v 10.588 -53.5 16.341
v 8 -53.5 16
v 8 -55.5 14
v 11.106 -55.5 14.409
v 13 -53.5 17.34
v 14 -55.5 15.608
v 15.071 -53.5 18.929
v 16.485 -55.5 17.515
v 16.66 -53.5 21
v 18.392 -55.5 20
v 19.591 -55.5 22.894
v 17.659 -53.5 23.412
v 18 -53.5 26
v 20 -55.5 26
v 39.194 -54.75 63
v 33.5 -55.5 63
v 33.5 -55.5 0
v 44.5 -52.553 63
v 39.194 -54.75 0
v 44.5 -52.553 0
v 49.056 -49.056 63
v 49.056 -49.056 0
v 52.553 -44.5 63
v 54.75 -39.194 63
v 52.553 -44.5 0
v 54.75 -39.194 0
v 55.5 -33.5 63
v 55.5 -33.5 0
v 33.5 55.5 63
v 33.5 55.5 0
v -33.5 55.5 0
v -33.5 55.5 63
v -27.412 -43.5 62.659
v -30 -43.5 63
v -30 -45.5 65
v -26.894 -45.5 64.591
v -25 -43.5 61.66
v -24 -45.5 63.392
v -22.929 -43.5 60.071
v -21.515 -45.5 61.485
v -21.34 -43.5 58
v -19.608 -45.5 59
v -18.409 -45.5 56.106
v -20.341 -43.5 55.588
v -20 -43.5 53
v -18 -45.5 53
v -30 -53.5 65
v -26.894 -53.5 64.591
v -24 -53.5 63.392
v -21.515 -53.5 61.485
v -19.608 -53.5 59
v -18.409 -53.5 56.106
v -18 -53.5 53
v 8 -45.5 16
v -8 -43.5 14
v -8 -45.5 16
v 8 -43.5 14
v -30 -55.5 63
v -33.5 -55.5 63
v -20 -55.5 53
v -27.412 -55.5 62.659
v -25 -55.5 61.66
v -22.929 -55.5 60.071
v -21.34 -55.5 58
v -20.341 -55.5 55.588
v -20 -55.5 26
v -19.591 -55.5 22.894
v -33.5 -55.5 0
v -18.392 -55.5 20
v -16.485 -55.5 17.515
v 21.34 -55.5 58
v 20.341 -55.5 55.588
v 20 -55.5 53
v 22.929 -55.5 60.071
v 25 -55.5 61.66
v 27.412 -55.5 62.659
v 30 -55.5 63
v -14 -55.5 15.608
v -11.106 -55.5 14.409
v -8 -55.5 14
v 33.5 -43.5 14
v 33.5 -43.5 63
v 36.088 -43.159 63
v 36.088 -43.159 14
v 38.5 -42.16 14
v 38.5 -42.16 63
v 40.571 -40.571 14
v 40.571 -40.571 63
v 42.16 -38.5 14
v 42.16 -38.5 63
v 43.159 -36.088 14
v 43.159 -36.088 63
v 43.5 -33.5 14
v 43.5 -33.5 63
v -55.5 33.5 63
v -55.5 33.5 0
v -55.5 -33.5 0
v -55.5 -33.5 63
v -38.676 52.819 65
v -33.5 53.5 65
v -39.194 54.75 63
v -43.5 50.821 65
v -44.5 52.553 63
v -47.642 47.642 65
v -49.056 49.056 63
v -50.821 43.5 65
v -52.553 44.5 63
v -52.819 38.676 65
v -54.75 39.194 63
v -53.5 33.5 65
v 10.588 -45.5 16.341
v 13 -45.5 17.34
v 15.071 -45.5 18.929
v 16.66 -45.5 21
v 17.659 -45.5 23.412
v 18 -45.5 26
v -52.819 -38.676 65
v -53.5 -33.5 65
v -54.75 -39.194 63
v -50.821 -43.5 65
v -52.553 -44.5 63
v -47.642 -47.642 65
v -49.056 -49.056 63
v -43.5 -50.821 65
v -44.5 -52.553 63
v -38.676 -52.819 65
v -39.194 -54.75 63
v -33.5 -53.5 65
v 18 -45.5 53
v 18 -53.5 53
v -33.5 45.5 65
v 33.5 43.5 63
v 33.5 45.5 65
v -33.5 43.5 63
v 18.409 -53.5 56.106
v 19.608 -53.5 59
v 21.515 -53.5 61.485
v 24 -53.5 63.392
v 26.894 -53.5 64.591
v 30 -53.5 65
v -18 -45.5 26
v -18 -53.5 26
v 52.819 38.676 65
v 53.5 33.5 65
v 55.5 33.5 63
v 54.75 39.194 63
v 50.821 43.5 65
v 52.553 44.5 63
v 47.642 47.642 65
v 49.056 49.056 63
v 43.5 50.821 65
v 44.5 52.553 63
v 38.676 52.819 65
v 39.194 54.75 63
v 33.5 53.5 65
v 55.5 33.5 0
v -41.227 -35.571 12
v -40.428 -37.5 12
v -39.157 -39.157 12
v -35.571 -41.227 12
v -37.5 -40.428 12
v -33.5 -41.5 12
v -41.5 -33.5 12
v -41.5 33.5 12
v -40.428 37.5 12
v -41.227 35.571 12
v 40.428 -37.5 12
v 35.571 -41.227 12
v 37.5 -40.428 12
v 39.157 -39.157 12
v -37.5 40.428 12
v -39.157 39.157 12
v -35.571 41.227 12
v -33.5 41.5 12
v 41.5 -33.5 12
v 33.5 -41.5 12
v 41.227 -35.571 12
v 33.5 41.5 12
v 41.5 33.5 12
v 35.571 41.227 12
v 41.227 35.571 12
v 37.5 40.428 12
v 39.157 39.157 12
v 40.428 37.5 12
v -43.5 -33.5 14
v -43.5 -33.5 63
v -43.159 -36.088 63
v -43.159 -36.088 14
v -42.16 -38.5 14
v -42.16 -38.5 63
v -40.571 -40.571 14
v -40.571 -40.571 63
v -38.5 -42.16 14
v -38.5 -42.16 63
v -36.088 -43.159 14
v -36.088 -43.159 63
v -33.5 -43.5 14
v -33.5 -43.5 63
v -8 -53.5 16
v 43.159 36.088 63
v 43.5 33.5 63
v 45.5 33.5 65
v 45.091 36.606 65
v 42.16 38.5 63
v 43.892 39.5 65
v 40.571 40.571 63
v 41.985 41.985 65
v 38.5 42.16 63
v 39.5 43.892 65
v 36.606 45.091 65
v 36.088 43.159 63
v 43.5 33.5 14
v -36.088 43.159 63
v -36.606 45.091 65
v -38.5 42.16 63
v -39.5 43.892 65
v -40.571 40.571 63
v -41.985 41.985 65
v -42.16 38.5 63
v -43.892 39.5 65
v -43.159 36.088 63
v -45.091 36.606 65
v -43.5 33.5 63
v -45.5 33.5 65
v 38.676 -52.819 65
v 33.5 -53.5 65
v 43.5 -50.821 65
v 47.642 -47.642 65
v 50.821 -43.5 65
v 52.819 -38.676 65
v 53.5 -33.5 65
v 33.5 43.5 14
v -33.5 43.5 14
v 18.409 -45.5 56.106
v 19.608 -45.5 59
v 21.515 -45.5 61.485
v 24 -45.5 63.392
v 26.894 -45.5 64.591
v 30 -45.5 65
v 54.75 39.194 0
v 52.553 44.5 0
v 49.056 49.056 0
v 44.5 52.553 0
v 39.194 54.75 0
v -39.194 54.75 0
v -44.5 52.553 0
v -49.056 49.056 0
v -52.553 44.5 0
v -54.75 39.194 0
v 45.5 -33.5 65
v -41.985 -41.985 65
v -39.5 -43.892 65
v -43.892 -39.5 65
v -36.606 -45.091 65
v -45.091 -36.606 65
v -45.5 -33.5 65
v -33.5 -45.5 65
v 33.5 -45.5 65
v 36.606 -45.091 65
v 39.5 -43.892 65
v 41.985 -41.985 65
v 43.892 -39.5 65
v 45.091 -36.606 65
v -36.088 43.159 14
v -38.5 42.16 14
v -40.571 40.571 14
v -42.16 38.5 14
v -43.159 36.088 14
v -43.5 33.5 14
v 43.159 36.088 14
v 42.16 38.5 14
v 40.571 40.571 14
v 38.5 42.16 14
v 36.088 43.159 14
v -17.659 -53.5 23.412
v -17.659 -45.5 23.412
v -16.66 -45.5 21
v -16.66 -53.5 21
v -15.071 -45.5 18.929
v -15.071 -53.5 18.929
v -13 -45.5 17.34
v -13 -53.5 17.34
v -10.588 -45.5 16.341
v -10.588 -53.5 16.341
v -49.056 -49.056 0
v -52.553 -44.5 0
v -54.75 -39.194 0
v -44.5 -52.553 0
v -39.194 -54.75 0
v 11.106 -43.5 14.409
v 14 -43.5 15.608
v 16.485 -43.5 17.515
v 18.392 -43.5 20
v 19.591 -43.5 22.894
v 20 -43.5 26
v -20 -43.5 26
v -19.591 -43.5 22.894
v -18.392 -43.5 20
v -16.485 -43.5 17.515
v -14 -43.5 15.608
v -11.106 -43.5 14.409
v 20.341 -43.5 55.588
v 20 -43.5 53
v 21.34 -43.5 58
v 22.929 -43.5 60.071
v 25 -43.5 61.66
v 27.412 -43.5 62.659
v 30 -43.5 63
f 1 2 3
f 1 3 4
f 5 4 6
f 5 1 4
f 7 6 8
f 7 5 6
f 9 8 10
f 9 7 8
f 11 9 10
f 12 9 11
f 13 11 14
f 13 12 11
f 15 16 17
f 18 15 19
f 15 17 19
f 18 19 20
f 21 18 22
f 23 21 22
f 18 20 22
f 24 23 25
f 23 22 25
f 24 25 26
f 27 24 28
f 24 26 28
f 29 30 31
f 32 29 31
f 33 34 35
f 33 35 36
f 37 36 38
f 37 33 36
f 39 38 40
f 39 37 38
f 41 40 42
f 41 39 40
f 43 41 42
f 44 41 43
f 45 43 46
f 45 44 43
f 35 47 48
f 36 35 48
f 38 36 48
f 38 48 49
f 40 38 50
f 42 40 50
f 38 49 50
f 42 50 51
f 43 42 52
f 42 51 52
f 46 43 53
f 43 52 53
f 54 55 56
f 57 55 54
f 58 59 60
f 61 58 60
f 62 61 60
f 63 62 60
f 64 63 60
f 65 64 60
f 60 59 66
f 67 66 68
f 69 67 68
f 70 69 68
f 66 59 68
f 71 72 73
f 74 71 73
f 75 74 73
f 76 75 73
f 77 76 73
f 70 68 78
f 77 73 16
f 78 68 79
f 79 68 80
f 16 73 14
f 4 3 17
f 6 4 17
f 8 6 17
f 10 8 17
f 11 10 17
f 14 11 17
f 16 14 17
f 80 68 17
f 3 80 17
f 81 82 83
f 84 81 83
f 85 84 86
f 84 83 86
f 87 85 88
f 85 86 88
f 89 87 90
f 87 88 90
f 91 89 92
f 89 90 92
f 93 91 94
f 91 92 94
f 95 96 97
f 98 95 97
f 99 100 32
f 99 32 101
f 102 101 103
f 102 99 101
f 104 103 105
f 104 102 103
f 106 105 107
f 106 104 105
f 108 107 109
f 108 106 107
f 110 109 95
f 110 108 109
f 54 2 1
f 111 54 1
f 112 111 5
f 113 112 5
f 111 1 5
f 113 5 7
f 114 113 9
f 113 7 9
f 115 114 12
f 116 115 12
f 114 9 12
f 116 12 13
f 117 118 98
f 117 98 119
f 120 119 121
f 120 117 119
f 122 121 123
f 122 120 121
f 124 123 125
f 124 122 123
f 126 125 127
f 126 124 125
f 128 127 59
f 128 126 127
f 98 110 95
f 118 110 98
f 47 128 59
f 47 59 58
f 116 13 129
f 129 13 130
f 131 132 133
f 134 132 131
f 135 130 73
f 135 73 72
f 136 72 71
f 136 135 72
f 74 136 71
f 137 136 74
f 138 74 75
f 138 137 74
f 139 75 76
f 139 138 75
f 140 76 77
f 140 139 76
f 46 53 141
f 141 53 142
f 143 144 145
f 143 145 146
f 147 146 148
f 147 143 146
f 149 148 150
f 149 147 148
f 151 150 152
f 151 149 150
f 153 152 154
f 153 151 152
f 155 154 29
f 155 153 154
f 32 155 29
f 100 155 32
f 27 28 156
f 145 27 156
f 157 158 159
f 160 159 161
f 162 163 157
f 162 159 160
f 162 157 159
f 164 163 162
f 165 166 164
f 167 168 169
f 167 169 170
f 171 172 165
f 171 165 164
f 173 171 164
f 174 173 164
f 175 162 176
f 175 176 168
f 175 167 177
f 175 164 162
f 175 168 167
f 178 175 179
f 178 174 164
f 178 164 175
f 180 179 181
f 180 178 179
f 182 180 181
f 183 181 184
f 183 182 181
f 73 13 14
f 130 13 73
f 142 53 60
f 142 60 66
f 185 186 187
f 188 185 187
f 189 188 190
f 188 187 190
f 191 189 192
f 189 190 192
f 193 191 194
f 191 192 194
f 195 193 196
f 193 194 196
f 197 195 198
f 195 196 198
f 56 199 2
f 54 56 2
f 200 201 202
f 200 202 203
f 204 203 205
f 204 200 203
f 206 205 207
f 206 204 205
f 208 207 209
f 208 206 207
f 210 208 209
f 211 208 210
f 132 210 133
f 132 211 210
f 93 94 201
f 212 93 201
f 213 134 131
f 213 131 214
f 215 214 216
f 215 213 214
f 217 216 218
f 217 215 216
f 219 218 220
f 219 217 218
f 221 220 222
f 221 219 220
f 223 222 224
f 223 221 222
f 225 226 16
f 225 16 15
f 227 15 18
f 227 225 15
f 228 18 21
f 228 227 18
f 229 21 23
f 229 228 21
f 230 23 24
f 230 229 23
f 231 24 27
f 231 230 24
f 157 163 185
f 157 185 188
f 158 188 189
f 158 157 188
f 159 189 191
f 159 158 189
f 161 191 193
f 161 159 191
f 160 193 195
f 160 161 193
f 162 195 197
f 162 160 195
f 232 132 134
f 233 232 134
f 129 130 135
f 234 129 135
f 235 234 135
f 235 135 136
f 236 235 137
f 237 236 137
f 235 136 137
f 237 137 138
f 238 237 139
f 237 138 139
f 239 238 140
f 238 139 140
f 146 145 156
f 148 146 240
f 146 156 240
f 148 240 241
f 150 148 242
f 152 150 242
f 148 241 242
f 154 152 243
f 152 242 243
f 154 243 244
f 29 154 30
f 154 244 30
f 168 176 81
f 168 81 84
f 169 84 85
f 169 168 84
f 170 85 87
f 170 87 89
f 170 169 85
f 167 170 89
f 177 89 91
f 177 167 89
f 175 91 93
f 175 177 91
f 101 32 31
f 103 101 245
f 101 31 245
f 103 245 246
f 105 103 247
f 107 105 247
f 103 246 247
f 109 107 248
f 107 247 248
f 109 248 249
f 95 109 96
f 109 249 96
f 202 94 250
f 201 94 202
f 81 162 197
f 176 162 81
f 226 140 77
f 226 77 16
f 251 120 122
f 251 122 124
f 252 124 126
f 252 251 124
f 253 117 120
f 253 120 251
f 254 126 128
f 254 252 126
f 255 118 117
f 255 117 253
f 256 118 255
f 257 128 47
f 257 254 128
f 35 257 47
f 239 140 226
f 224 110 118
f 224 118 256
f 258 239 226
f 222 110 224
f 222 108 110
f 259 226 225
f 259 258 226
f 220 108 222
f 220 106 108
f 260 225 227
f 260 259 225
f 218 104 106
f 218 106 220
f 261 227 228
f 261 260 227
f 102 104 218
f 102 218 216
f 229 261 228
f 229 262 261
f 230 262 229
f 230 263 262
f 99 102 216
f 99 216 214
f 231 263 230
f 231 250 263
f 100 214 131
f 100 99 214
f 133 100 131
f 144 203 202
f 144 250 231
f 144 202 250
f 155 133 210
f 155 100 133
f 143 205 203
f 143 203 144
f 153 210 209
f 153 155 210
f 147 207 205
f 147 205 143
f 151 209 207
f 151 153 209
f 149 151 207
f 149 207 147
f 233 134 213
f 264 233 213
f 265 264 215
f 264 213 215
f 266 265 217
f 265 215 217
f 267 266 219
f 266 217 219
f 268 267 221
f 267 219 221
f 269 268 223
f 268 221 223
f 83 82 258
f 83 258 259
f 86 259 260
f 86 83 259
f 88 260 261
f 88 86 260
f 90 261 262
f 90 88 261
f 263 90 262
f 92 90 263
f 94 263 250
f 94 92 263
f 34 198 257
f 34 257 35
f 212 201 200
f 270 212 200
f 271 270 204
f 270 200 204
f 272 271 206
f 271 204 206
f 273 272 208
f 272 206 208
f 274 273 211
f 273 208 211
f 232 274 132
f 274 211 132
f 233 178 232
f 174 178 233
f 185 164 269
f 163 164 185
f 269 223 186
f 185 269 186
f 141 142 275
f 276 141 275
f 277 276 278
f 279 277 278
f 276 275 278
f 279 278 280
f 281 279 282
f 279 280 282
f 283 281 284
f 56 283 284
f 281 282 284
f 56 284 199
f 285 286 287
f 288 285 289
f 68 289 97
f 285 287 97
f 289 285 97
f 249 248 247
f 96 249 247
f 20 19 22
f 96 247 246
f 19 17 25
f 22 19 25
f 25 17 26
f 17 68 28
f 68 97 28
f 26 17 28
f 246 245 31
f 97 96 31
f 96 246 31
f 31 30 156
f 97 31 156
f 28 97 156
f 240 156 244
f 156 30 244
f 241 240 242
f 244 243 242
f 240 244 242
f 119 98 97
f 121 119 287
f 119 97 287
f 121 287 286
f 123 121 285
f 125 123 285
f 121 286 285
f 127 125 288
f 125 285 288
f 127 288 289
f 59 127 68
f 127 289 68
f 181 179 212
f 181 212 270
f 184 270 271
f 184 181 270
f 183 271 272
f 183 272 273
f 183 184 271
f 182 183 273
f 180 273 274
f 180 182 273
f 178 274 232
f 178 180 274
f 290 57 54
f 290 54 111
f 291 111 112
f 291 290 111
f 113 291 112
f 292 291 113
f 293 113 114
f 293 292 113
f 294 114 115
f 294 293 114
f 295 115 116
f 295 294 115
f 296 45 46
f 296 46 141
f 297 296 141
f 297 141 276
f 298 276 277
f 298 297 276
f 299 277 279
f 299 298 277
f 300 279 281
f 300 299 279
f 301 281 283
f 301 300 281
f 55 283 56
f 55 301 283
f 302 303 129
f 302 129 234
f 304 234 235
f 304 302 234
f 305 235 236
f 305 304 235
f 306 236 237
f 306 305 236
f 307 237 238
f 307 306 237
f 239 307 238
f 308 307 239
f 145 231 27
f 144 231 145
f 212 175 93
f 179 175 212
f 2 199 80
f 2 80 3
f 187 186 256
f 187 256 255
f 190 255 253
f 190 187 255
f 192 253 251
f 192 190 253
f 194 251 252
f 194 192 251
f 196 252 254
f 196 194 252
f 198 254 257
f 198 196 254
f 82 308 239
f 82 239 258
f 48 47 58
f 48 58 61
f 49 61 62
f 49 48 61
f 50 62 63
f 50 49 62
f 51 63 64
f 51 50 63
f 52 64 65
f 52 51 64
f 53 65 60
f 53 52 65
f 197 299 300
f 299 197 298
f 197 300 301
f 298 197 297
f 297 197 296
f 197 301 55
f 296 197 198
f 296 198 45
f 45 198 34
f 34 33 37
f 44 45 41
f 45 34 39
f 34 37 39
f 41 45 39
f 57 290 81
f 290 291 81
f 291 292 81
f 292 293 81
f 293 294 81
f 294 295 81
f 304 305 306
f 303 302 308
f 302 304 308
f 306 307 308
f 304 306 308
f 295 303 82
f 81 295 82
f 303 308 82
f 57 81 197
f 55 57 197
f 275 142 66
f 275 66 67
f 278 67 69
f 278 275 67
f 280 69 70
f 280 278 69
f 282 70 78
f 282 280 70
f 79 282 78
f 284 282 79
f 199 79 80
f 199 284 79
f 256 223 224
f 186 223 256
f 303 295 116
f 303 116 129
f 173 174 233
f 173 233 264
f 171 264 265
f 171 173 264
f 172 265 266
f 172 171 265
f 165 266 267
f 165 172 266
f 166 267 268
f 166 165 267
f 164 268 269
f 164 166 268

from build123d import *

# Parameters (mm, degrees)
F1_DEPTH = 65
F3_DEPTH = 53
F5_DEPTH = 12
F6_SIZE  = 1.99999


# Not quite as in the source:
# - a fillet or chamfer is up to 0.001 mm smaller than in the source, because OpenCascade refuses the exact size


with BuildPart() as f1:
    # F0 (on Top) → F1 (new body)
    with BuildSketch(Plane.XY):
        with BuildLine():
            Line((55.5, -33.5), (55.5, 33.5))
            ThreePointArc((55.5, 33.5), (49.0563491861, 49.0563491861), (33.5, 55.5))
            Line((33.5, 55.5), (-33.5, 55.5))
            ThreePointArc((-33.5, 55.5), (-49.0563491861, 49.0563491861), (-55.5, 33.5))
            Line((-55.5, 33.5), (-55.5, -33.5))
            ThreePointArc((-55.5, -33.5), (-49.0563491861, -49.0563491861), (-33.5, -55.5))
            Line((-33.5, -55.5), (33.5, -55.5))
            ThreePointArc((33.5, -55.5), (49.0563491861, -49.0563491861), (55.5, -33.5))
        make_face()
    extrude(amount=F1_DEPTH)

    # F2 (on face) → F3 (cut, through all)
    with BuildSketch(Plane.XY.offset(65)):
        with BuildLine():
            Line((33.5, 43.5), (-33.5, 43.5))
            ThreePointArc((-33.5, 43.5), (-40.5710678119, 40.5710678119), (-43.5, 33.5))
            Line((-43.5, 33.5), (-43.5, -33.5))
            ThreePointArc((-43.5, -33.5), (-40.5710678119, -40.5710678119), (-33.5, -43.5))
            Line((-33.5, -43.5), (33.5, -43.5))
            ThreePointArc((33.5, -43.5), (40.5710678119, -40.5710678119), (43.5, -33.5))
            Line((43.5, -33.5), (43.5, 33.5))
            ThreePointArc((43.5, 33.5), (40.5710678119, 40.5710678119), (33.5, 43.5))
        make_face()
    extrude(amount=-F3_DEPTH, mode=Mode.SUBTRACT)

    # F4 (on face) → F5 (cut, through all)
    with BuildSketch(Plane.XZ.offset(55.5)):
        with BuildLine():
            ThreePointArc((-30, 65), (-21.5147186258, 61.4852813742), (-18, 53))
            Line((-18, 53), (-18, 26))
            ThreePointArc((-18, 26), (-15.0710678119, 18.9289321881), (-8, 16))
            Line((-8, 16), (8, 16))
            ThreePointArc((8, 16), (15.0710678119, 18.9289321881), (18, 26))
            Line((18, 26), (18, 53))
            ThreePointArc((18, 53), (21.5147186258, 61.4852813742), (30, 65))
            Line((30, 65), (-30, 65))
        make_face()
    extrude(amount=-F5_DEPTH, mode=Mode.SUBTRACT)

    # F6 (size 2 in the source; OpenCascade refuses exactly that, so slightly less here)
    f6_edges = [f1.edges().sort_by_distance(p)[0] for p in [
        (55.5, 0, 65),
        (-43.5, 0, 65),
        (0, 43.5, 12),
        (-40.571068, 40.571068, 12),
        (-43.5, 0, 12),
        (-40.571068, -40.571068, 12),
        (0, -43.5, 12),
        (40.571068, -40.571068, 12),
        (43.5, 0, 12),
        (40.571068, 40.571068, 12),
    ]]
    chamfer(f6_edges, length=F6_SIZE)


solid = f1.part
